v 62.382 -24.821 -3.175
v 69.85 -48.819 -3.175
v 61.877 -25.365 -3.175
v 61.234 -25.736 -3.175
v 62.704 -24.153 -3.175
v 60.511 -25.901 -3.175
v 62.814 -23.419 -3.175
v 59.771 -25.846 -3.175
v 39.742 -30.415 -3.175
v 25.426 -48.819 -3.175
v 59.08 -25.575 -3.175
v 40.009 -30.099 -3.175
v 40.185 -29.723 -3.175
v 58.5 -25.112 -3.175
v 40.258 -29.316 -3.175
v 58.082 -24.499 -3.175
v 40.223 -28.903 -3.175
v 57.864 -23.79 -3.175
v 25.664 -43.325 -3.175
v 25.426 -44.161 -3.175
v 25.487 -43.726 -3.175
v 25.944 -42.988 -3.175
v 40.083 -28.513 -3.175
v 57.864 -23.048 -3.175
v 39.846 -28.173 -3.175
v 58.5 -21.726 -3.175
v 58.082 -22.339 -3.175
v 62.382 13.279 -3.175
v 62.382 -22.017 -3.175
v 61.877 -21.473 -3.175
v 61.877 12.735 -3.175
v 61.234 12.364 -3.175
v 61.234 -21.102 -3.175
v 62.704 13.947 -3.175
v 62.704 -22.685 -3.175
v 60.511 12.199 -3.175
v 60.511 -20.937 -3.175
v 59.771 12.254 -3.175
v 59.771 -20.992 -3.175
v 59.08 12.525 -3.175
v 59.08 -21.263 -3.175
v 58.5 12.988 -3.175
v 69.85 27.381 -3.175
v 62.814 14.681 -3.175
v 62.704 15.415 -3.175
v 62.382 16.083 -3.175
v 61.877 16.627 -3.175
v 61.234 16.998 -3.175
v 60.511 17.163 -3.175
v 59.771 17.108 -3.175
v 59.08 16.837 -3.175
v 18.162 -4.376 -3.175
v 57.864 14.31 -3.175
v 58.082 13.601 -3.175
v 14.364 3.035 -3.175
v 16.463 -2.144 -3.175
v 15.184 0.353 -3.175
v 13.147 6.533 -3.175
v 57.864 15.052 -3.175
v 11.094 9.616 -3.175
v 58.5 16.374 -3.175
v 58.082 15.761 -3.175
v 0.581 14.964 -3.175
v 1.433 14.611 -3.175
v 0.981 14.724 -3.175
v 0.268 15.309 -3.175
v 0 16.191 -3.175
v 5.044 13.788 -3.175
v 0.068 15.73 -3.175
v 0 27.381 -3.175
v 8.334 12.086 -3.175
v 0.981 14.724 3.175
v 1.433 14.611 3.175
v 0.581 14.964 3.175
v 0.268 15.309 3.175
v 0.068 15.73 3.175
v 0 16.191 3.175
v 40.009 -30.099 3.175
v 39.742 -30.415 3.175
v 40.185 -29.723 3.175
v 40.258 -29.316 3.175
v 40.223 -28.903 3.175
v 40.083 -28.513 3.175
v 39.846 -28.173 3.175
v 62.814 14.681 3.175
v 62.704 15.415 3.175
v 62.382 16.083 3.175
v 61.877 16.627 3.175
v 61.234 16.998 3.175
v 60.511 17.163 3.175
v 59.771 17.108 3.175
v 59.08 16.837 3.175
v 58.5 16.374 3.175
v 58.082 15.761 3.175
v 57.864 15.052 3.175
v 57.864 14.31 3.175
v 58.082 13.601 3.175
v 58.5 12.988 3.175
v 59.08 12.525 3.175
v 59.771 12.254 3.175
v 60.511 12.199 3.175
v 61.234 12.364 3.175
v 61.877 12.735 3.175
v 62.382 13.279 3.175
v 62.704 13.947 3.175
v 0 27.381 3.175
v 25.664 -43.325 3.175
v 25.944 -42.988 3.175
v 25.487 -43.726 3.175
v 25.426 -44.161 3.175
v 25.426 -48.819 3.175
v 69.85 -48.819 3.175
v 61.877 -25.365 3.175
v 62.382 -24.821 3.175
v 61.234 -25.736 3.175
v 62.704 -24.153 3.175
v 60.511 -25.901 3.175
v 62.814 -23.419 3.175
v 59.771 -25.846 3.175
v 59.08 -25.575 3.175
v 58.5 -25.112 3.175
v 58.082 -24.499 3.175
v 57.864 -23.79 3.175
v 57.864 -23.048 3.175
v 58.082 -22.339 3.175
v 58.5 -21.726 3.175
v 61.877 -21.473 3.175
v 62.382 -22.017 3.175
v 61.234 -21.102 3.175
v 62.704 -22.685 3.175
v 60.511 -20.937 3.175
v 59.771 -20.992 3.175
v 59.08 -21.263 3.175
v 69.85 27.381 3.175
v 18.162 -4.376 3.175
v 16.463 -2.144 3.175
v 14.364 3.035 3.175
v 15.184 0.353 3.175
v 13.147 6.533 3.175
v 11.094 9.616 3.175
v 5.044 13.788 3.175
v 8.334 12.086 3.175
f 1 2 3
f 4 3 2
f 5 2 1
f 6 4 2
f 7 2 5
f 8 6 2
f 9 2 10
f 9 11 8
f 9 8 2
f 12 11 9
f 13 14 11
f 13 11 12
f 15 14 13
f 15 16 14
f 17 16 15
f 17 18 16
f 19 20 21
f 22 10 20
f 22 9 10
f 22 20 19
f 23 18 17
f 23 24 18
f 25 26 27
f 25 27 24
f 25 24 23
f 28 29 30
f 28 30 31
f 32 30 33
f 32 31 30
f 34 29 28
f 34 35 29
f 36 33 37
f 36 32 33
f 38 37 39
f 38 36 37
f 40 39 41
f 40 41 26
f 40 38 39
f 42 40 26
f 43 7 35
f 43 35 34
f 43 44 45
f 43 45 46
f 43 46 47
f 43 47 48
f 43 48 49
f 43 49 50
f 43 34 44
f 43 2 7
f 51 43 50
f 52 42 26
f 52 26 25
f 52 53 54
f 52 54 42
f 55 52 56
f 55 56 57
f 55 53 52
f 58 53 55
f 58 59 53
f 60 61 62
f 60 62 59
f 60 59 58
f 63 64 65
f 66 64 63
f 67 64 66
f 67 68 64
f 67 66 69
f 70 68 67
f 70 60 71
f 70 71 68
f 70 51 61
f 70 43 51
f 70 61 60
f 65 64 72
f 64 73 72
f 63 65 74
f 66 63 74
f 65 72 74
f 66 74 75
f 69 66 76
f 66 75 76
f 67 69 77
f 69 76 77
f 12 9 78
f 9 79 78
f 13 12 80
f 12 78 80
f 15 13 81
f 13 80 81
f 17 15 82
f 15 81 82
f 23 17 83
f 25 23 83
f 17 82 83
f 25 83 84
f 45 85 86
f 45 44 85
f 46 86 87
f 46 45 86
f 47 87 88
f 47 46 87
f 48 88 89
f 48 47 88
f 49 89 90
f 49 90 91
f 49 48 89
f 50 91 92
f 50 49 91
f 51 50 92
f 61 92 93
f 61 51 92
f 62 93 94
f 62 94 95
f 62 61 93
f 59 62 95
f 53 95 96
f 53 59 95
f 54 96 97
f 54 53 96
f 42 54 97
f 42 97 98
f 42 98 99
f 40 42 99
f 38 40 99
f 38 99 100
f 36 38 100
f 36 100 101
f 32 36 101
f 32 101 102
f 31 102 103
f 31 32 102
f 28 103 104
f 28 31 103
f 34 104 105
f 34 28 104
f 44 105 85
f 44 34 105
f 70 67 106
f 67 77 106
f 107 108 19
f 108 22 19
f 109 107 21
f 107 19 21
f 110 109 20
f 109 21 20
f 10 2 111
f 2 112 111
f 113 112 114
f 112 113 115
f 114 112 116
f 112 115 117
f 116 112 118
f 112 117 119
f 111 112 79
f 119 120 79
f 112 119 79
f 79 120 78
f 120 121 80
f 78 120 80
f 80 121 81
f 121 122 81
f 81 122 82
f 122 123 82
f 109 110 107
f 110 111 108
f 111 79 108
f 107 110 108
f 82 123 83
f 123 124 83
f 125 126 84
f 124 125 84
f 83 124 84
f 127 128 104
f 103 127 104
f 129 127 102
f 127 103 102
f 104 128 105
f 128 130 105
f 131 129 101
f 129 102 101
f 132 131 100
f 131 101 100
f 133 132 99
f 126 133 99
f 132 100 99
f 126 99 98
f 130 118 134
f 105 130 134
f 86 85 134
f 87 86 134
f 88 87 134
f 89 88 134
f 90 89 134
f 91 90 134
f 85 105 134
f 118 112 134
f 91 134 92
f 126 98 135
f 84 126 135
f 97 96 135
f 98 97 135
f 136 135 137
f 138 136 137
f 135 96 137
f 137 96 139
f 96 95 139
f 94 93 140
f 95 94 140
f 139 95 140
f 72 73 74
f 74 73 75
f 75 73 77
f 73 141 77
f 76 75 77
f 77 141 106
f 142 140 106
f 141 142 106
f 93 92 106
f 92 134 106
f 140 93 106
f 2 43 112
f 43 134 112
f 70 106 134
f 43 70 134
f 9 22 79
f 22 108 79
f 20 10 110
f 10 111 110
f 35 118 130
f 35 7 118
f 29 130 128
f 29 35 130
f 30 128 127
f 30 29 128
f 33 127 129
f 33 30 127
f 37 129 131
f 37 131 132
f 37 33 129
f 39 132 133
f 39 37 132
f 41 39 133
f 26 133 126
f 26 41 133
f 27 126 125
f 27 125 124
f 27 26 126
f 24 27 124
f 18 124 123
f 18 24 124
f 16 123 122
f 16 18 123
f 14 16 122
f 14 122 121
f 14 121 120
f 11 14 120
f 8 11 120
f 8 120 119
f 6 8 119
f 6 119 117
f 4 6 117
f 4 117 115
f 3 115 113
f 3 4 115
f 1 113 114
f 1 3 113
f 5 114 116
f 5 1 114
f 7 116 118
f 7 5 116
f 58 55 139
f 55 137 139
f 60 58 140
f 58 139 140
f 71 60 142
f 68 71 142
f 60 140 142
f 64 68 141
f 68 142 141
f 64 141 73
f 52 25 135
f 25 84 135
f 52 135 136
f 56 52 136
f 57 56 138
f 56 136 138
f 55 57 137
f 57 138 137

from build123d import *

# Parameters (mm, degrees)
SKETCH1_R           = 2.4892
BOSS_EXTRUDE1_DEPTH = 3.175
FILLET1_R           = 1.5875


with BuildPart() as part:
    # Sketch1 → Boss-Extrude1 (new, symmetric)
    with BuildSketch(Plane.XY):
        with BuildLine():
            Line((0, 27.3812), (69.85, 27.3812))
            Line((69.85, 27.3812), (69.85, -48.8188))
            Line((69.85, -48.8188), (25.42603388, -48.8188))
            Line((25.42603388, -48.8188), (25.42603388, -43.459816684))
            Line((25.42603388, -43.459816684), (40.915153964, -29.346022579))
            Line((40.915153964, -29.346022579), (18.162007104, -4.375683536))
            ThreePointArc((18.162007104, -4.375683536), (15.768494782, -0.923849067), (14.364087476, 3.034901057))
            ThreePointArc((14.364087476, 3.034901057), (9.246124703, 11.403806883), (0, 14.6812))
            Line((0, 14.6812), (0, 27.3812))
        make_face()
        with Locations((60.325, -23.4188)):
            Circle(SKETCH1_R, mode=Mode.SUBTRACT)
        with Locations((60.325, 14.6812)):
            Circle(SKETCH1_R, mode=Mode.SUBTRACT)
    extrude(amount=BOSS_EXTRUDE1_DEPTH, both=True)

    # Fillet1
    fillet1_edges = [part.edges().sort_by_distance(p)[0] for p in [
        (25.42603388, -43.459816684, 0),
        (40.915153964, -29.346022579, 0),
        (0, 14.6812, 0),
    ]]
    fillet(fillet1_edges, radius=FILLET1_R)


solid = part.part
